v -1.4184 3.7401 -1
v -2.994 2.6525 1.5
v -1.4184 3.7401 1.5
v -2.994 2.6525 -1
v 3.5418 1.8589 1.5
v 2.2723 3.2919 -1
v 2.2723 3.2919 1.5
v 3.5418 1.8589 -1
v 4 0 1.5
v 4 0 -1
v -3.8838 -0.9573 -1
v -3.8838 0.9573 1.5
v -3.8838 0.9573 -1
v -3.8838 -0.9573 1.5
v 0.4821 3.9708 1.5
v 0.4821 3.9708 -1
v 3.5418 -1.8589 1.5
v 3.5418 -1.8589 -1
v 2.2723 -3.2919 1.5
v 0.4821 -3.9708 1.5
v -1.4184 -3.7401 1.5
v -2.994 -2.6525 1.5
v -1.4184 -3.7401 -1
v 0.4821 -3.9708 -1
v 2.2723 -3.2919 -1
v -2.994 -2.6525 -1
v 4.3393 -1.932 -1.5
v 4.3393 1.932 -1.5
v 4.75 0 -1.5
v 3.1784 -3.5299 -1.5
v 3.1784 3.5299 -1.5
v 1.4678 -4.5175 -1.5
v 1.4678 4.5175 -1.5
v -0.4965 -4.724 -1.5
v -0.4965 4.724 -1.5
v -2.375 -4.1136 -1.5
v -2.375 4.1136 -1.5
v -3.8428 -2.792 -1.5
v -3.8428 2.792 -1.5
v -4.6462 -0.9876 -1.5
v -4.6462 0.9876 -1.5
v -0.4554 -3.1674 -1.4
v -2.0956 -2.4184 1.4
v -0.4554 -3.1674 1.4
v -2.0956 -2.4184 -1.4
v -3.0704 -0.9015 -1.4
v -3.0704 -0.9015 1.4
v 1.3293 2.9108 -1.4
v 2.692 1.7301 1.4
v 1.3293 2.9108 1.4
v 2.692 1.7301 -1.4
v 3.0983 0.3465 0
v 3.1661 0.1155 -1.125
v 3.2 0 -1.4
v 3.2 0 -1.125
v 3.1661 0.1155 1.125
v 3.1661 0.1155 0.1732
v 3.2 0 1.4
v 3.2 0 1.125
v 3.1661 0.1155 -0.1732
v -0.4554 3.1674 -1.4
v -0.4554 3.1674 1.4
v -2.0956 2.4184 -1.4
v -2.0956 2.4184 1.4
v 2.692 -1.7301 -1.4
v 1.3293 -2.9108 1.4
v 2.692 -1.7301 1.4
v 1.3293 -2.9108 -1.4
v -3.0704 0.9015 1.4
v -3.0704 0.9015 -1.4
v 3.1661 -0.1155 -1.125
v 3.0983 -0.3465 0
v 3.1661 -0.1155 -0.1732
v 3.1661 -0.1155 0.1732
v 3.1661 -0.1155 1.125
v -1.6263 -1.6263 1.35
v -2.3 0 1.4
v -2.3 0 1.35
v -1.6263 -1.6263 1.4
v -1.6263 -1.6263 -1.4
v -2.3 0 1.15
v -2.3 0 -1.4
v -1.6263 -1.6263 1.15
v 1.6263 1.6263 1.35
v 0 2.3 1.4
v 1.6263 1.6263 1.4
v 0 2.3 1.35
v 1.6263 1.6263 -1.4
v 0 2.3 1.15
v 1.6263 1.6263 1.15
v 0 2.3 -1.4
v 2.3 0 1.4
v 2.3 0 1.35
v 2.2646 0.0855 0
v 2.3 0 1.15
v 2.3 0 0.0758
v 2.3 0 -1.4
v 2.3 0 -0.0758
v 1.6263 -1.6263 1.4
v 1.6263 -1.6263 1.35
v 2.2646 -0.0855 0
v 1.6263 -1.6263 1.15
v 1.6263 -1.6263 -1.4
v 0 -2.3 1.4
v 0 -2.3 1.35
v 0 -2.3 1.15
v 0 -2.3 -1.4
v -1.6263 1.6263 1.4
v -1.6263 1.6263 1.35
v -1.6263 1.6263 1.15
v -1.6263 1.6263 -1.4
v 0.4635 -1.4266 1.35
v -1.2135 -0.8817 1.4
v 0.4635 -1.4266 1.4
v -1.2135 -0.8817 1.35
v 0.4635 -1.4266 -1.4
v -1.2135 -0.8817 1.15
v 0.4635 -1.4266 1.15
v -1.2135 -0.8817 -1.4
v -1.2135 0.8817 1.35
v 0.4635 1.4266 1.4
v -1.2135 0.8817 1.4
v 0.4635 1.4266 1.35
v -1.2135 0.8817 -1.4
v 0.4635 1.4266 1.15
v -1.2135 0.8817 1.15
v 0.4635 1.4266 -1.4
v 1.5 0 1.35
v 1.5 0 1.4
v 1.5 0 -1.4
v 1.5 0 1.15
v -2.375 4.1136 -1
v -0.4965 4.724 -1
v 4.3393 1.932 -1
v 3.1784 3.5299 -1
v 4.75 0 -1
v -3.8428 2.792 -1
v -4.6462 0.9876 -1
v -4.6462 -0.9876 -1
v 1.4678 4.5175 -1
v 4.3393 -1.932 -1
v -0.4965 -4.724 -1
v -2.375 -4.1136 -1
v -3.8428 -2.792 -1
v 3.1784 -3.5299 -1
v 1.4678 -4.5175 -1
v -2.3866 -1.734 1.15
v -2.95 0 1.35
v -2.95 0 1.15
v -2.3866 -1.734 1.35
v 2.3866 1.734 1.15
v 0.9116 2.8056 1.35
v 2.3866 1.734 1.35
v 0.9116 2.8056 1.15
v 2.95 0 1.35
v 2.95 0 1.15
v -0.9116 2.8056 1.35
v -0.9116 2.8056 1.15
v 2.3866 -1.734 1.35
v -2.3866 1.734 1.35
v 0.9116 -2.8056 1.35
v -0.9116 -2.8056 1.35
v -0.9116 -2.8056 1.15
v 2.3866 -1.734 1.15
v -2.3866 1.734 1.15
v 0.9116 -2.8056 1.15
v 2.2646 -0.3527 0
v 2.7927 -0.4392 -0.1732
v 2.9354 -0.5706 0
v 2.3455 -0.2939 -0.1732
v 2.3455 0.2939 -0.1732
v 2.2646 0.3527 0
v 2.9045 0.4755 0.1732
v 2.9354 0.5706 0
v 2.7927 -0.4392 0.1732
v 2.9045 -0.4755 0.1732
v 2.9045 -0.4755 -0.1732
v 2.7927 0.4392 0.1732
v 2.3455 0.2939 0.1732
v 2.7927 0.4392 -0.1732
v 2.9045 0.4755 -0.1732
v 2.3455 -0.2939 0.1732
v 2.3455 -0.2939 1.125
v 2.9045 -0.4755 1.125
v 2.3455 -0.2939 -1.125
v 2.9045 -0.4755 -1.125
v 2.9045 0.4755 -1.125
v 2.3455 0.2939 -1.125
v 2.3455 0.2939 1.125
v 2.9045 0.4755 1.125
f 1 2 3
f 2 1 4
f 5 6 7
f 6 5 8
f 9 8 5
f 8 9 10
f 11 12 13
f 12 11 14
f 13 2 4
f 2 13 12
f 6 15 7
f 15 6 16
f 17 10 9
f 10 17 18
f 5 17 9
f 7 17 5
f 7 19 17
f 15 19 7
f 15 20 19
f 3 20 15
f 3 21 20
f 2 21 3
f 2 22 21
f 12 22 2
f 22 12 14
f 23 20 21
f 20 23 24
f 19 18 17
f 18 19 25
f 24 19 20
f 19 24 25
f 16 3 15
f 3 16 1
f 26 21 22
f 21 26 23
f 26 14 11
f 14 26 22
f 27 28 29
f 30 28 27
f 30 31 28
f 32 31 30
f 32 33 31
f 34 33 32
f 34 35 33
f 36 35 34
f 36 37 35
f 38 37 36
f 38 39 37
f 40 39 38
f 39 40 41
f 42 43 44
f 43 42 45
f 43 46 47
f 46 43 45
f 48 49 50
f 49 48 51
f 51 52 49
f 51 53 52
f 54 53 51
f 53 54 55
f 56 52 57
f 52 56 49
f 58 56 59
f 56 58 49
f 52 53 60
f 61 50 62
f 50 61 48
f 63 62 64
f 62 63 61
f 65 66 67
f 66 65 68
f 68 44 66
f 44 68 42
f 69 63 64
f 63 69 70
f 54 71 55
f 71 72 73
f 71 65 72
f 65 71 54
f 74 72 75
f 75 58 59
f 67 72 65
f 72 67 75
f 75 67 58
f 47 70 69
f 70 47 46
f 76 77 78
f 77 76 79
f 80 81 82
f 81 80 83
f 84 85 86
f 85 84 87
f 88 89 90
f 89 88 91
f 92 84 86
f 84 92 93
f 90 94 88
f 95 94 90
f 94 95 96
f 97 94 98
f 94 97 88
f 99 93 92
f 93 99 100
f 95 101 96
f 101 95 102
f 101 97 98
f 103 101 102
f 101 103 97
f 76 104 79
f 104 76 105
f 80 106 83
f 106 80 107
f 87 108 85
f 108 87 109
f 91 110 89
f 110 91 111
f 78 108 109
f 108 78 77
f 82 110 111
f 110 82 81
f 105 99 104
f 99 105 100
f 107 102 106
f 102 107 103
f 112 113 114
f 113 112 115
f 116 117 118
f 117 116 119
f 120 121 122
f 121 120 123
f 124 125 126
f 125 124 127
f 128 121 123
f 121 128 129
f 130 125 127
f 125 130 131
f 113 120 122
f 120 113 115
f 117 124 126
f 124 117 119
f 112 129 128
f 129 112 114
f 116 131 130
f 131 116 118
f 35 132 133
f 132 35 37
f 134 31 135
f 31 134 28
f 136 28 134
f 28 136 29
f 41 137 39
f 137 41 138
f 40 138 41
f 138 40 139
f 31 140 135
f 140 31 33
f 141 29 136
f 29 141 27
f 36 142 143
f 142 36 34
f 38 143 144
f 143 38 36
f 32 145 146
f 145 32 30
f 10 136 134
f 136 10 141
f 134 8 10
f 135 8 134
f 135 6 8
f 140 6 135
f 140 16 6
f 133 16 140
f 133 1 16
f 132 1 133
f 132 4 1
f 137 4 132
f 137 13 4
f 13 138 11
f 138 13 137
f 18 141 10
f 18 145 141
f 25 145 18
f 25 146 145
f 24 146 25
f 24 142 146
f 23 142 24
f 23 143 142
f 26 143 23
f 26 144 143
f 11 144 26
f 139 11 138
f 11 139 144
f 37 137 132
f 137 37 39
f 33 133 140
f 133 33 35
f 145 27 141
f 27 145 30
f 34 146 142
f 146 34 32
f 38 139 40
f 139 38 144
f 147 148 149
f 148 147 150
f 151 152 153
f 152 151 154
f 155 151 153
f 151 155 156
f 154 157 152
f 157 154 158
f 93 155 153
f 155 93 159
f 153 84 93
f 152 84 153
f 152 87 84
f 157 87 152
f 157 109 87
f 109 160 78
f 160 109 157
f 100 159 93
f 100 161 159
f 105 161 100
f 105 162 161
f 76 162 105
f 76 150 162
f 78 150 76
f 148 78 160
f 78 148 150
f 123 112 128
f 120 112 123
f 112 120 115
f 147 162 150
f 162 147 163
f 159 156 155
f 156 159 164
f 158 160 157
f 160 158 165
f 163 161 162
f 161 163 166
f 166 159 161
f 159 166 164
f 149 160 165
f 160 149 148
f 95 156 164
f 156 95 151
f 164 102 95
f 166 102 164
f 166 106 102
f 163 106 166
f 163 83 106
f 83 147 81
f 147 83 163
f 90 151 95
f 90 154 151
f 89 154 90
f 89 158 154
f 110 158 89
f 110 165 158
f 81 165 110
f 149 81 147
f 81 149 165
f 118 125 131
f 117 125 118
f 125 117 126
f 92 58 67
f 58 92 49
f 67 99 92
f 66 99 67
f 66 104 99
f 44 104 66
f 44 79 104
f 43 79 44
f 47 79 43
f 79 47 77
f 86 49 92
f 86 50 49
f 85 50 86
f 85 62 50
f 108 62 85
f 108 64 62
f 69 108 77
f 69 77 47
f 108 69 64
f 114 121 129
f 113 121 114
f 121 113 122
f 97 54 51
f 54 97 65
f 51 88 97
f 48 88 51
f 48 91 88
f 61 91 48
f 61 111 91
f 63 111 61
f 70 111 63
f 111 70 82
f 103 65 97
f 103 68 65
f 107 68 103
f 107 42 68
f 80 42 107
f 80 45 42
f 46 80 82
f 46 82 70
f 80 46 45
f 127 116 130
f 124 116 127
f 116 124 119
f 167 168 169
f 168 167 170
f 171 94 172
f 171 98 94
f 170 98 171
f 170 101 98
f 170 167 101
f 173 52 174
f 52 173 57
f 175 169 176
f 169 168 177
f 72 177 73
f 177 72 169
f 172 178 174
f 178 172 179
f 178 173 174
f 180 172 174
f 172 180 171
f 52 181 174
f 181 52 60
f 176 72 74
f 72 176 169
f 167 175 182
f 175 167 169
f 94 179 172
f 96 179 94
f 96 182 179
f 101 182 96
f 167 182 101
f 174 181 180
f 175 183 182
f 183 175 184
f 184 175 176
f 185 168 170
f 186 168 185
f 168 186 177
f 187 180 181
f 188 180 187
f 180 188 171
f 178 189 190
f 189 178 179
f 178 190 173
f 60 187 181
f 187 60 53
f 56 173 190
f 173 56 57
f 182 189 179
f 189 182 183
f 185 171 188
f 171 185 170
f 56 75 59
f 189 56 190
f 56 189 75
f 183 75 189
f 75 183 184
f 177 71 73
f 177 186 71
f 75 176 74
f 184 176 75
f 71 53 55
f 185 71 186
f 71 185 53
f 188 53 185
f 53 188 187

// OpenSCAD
// Parameters
bore_diameter_mm = 3; //[1.5:6:0.1]
outer_diameter_mm = 8; //[4:16:0.1]
width_mm = 3; //[1.5:6:0.1]
flange_diameter_mm = 9.5; //[4.75:19:0.1]
flange_width_mm = 0.5; //[0.25:1:0.05]
rim_thickness_mm = 0.8; //[0.4:1.6:0.05]
hub_thickness_mm = 0.8; //[0.4:1.6:0.05]
chamfer_mm = 0.1; //[0.05:0.3:0.01]
shield_clearance_mm = 0.25; //[0.1:0.6:0.05]
shield_thickness_mm = 0.2; //[0.1:0.5:0.05]
shield_inset_mm = 0.15; //[0.05:0.5:0.05]
ball_diameter_mm = 1.2; //[0.6:2.4:0.05]
ball_overlap_mm = 0.2; //[0.1:0.6:0.05]
eps_mm = 0.05; //[0.01:0.2:0.01]

// Ball Bearing - complete geometry
module ball_bearing() {
  color("Silver") {
    // Outer Race
    difference() {
      cylinder(r=outer_diameter_mm/2, h=width_mm, center=true);
      cylinder(r=outer_diameter_mm/2 - rim_thickness_mm, h=width_mm + 2*eps_mm, center=true);
    }
    // Inner Race
    difference() {
      cylinder(r=bore_diameter_mm/2 + hub_thickness_mm, h=width_mm, center=true);
      cylinder(r=bore_diameter_mm/2, h=width_mm + 2*eps_mm, center=true);
    }
    // Flange
    translate([0, 0, -width_mm/2 + flange_width_mm/2])
      difference() {
        cylinder(r=flange_diameter_mm/2, h=flange_width_mm, center=true);
        cylinder(r=outer_diameter_mm/2 - rim_thickness_mm + eps_mm, h=flange_width_mm + 2*eps_mm, center=true);
      }
    // Shields
    difference() {
      translate([0, 0, width_mm/2 - shield_inset_mm - shield_thickness_mm/2])
        cylinder(r=outer_diameter_mm/2 - rim_thickness_mm - shield_clearance_mm, h=shield_thickness_mm, center=true);
      translate([0, 0, -width_mm/2 + flange_width_mm + shield_inset_mm + shield_thickness_mm/2])
        cylinder(r=outer_diameter_mm/2 - rim_thickness_mm - shield_clearance_mm, h=shield_thickness_mm, center=true);
      cylinder(r=bore_diameter_mm/2 + hub_thickness_mm + shield_clearance_mm, h=shield_thickness_mm + 2*eps_mm, center=true);
    }
    // Chamfers
    union() {
      translate([0, 0, width_mm/2 - chamfer_mm/2])
        cylinder(r1=outer_diameter_mm/2, r2=outer_diameter_mm/2 - chamfer_mm, h=chamfer_mm, center=true);
      translate([0, 0, -width_mm/2 + chamfer_mm/2])
        cylinder(r1=outer_diameter_mm/2, r2=outer_diameter_mm/2 - chamfer_mm, h=chamfer_mm, center=true);
      translate([0, 0, width_mm/2 - chamfer_mm/2])
        cylinder(r1=bore_diameter_mm/2 + hub_thickness_mm, r2=bore_diameter_mm/2 + hub_thickness_mm - chamfer_mm, h=chamfer_mm, center=true);
      translate([0, 0, -width_mm/2 + chamfer_mm/2])
        cylinder(r1=bore_diameter_mm/2 + hub_thickness_mm, r2=bore_diameter_mm/2 + hub_thickness_mm - chamfer_mm, h=chamfer_mm, center=true);
    }
  }
}

// Bearing Ball - complete geometry
module bearing_ball() {
  color("Copper") {
    translate([(bore_diameter_mm/2 + hub_thickness_mm + (outer_diameter_mm/2 - rim_thickness_mm))/2, 0, 0])
      sphere(r=ball_diameter_mm/2);
    translate([(bore_diameter_mm/2 + hub_thickness_mm + (outer_diameter_mm/2 - rim_thickness_mm))/2, 0, 0])
      cylinder(r=ball_diameter_mm/2 - ball_overlap_mm/2, h=width_mm - 2*(shield_inset_mm + shield_thickness_mm) - eps_mm, center=true);
  }
}

// Assembly
module assembly() {
  ball_bearing();
  bearing_ball();
}

assembly();
